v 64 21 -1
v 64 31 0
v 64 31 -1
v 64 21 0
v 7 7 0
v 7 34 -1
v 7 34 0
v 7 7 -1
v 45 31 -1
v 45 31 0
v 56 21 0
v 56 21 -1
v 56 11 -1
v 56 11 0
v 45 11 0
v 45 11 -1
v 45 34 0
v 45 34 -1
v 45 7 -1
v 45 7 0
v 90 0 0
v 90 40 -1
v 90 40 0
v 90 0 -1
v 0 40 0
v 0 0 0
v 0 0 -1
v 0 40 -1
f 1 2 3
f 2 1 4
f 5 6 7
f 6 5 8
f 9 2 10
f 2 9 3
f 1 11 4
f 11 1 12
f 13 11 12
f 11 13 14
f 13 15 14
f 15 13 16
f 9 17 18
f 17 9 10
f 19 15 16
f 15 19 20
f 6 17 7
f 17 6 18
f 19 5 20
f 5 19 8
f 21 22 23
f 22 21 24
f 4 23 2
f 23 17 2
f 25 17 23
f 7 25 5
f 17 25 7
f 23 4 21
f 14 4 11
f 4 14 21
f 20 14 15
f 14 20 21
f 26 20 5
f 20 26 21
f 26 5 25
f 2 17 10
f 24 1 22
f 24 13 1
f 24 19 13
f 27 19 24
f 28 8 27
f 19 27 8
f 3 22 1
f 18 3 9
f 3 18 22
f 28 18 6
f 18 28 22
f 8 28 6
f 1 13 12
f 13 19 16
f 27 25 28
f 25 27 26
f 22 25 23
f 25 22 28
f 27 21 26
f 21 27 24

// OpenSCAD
module usc(){

module cutout1()
{
       union()
       {
       translate(v=[0,10,0])
       cube([57,10,4]);
       cube([49,20,4]);

       }
 }

module cutout2()
{
       cube([38,27,4]);
}

module block()
{
      cube([90,40,1]);
}

module magcut()
{
union() {
       translate(v=[7,11,-2])
       cutout1();
       translate(v=[7,7,-2]) 
       cutout2();
 }
}

module butt()
{
  union ()
    {
    translate(v=[-2,5,3])
    cube([96,28,32]);
    translate(v=[-2,4,8])
    cube([96,30,48]);
   }
}


module ejecthole()
{
       translate(v=[12,7,9]) { 
       cube([55,12,28]);
       }
 }

module ejectblock()
{
       translate(v=[10,8,6]) { 
       cube([60,10,34]); //ejector mold\
       }
   
 }


module eject ()
{
       translate(v=[5,26,8])
       {
        difference()
        //union()
        {
          ejectblock();
          ejecthole();
        }
       }
}



union(){
    translate(v=[0,0,-1])
    {
//intersection(){
//render(convexity = 1){
difference()
{
block();
magcut();
//butt();
//translate(v=[5,26,8]){ejecthole();}
} //difference
//eject();

}
}

}

usc();
